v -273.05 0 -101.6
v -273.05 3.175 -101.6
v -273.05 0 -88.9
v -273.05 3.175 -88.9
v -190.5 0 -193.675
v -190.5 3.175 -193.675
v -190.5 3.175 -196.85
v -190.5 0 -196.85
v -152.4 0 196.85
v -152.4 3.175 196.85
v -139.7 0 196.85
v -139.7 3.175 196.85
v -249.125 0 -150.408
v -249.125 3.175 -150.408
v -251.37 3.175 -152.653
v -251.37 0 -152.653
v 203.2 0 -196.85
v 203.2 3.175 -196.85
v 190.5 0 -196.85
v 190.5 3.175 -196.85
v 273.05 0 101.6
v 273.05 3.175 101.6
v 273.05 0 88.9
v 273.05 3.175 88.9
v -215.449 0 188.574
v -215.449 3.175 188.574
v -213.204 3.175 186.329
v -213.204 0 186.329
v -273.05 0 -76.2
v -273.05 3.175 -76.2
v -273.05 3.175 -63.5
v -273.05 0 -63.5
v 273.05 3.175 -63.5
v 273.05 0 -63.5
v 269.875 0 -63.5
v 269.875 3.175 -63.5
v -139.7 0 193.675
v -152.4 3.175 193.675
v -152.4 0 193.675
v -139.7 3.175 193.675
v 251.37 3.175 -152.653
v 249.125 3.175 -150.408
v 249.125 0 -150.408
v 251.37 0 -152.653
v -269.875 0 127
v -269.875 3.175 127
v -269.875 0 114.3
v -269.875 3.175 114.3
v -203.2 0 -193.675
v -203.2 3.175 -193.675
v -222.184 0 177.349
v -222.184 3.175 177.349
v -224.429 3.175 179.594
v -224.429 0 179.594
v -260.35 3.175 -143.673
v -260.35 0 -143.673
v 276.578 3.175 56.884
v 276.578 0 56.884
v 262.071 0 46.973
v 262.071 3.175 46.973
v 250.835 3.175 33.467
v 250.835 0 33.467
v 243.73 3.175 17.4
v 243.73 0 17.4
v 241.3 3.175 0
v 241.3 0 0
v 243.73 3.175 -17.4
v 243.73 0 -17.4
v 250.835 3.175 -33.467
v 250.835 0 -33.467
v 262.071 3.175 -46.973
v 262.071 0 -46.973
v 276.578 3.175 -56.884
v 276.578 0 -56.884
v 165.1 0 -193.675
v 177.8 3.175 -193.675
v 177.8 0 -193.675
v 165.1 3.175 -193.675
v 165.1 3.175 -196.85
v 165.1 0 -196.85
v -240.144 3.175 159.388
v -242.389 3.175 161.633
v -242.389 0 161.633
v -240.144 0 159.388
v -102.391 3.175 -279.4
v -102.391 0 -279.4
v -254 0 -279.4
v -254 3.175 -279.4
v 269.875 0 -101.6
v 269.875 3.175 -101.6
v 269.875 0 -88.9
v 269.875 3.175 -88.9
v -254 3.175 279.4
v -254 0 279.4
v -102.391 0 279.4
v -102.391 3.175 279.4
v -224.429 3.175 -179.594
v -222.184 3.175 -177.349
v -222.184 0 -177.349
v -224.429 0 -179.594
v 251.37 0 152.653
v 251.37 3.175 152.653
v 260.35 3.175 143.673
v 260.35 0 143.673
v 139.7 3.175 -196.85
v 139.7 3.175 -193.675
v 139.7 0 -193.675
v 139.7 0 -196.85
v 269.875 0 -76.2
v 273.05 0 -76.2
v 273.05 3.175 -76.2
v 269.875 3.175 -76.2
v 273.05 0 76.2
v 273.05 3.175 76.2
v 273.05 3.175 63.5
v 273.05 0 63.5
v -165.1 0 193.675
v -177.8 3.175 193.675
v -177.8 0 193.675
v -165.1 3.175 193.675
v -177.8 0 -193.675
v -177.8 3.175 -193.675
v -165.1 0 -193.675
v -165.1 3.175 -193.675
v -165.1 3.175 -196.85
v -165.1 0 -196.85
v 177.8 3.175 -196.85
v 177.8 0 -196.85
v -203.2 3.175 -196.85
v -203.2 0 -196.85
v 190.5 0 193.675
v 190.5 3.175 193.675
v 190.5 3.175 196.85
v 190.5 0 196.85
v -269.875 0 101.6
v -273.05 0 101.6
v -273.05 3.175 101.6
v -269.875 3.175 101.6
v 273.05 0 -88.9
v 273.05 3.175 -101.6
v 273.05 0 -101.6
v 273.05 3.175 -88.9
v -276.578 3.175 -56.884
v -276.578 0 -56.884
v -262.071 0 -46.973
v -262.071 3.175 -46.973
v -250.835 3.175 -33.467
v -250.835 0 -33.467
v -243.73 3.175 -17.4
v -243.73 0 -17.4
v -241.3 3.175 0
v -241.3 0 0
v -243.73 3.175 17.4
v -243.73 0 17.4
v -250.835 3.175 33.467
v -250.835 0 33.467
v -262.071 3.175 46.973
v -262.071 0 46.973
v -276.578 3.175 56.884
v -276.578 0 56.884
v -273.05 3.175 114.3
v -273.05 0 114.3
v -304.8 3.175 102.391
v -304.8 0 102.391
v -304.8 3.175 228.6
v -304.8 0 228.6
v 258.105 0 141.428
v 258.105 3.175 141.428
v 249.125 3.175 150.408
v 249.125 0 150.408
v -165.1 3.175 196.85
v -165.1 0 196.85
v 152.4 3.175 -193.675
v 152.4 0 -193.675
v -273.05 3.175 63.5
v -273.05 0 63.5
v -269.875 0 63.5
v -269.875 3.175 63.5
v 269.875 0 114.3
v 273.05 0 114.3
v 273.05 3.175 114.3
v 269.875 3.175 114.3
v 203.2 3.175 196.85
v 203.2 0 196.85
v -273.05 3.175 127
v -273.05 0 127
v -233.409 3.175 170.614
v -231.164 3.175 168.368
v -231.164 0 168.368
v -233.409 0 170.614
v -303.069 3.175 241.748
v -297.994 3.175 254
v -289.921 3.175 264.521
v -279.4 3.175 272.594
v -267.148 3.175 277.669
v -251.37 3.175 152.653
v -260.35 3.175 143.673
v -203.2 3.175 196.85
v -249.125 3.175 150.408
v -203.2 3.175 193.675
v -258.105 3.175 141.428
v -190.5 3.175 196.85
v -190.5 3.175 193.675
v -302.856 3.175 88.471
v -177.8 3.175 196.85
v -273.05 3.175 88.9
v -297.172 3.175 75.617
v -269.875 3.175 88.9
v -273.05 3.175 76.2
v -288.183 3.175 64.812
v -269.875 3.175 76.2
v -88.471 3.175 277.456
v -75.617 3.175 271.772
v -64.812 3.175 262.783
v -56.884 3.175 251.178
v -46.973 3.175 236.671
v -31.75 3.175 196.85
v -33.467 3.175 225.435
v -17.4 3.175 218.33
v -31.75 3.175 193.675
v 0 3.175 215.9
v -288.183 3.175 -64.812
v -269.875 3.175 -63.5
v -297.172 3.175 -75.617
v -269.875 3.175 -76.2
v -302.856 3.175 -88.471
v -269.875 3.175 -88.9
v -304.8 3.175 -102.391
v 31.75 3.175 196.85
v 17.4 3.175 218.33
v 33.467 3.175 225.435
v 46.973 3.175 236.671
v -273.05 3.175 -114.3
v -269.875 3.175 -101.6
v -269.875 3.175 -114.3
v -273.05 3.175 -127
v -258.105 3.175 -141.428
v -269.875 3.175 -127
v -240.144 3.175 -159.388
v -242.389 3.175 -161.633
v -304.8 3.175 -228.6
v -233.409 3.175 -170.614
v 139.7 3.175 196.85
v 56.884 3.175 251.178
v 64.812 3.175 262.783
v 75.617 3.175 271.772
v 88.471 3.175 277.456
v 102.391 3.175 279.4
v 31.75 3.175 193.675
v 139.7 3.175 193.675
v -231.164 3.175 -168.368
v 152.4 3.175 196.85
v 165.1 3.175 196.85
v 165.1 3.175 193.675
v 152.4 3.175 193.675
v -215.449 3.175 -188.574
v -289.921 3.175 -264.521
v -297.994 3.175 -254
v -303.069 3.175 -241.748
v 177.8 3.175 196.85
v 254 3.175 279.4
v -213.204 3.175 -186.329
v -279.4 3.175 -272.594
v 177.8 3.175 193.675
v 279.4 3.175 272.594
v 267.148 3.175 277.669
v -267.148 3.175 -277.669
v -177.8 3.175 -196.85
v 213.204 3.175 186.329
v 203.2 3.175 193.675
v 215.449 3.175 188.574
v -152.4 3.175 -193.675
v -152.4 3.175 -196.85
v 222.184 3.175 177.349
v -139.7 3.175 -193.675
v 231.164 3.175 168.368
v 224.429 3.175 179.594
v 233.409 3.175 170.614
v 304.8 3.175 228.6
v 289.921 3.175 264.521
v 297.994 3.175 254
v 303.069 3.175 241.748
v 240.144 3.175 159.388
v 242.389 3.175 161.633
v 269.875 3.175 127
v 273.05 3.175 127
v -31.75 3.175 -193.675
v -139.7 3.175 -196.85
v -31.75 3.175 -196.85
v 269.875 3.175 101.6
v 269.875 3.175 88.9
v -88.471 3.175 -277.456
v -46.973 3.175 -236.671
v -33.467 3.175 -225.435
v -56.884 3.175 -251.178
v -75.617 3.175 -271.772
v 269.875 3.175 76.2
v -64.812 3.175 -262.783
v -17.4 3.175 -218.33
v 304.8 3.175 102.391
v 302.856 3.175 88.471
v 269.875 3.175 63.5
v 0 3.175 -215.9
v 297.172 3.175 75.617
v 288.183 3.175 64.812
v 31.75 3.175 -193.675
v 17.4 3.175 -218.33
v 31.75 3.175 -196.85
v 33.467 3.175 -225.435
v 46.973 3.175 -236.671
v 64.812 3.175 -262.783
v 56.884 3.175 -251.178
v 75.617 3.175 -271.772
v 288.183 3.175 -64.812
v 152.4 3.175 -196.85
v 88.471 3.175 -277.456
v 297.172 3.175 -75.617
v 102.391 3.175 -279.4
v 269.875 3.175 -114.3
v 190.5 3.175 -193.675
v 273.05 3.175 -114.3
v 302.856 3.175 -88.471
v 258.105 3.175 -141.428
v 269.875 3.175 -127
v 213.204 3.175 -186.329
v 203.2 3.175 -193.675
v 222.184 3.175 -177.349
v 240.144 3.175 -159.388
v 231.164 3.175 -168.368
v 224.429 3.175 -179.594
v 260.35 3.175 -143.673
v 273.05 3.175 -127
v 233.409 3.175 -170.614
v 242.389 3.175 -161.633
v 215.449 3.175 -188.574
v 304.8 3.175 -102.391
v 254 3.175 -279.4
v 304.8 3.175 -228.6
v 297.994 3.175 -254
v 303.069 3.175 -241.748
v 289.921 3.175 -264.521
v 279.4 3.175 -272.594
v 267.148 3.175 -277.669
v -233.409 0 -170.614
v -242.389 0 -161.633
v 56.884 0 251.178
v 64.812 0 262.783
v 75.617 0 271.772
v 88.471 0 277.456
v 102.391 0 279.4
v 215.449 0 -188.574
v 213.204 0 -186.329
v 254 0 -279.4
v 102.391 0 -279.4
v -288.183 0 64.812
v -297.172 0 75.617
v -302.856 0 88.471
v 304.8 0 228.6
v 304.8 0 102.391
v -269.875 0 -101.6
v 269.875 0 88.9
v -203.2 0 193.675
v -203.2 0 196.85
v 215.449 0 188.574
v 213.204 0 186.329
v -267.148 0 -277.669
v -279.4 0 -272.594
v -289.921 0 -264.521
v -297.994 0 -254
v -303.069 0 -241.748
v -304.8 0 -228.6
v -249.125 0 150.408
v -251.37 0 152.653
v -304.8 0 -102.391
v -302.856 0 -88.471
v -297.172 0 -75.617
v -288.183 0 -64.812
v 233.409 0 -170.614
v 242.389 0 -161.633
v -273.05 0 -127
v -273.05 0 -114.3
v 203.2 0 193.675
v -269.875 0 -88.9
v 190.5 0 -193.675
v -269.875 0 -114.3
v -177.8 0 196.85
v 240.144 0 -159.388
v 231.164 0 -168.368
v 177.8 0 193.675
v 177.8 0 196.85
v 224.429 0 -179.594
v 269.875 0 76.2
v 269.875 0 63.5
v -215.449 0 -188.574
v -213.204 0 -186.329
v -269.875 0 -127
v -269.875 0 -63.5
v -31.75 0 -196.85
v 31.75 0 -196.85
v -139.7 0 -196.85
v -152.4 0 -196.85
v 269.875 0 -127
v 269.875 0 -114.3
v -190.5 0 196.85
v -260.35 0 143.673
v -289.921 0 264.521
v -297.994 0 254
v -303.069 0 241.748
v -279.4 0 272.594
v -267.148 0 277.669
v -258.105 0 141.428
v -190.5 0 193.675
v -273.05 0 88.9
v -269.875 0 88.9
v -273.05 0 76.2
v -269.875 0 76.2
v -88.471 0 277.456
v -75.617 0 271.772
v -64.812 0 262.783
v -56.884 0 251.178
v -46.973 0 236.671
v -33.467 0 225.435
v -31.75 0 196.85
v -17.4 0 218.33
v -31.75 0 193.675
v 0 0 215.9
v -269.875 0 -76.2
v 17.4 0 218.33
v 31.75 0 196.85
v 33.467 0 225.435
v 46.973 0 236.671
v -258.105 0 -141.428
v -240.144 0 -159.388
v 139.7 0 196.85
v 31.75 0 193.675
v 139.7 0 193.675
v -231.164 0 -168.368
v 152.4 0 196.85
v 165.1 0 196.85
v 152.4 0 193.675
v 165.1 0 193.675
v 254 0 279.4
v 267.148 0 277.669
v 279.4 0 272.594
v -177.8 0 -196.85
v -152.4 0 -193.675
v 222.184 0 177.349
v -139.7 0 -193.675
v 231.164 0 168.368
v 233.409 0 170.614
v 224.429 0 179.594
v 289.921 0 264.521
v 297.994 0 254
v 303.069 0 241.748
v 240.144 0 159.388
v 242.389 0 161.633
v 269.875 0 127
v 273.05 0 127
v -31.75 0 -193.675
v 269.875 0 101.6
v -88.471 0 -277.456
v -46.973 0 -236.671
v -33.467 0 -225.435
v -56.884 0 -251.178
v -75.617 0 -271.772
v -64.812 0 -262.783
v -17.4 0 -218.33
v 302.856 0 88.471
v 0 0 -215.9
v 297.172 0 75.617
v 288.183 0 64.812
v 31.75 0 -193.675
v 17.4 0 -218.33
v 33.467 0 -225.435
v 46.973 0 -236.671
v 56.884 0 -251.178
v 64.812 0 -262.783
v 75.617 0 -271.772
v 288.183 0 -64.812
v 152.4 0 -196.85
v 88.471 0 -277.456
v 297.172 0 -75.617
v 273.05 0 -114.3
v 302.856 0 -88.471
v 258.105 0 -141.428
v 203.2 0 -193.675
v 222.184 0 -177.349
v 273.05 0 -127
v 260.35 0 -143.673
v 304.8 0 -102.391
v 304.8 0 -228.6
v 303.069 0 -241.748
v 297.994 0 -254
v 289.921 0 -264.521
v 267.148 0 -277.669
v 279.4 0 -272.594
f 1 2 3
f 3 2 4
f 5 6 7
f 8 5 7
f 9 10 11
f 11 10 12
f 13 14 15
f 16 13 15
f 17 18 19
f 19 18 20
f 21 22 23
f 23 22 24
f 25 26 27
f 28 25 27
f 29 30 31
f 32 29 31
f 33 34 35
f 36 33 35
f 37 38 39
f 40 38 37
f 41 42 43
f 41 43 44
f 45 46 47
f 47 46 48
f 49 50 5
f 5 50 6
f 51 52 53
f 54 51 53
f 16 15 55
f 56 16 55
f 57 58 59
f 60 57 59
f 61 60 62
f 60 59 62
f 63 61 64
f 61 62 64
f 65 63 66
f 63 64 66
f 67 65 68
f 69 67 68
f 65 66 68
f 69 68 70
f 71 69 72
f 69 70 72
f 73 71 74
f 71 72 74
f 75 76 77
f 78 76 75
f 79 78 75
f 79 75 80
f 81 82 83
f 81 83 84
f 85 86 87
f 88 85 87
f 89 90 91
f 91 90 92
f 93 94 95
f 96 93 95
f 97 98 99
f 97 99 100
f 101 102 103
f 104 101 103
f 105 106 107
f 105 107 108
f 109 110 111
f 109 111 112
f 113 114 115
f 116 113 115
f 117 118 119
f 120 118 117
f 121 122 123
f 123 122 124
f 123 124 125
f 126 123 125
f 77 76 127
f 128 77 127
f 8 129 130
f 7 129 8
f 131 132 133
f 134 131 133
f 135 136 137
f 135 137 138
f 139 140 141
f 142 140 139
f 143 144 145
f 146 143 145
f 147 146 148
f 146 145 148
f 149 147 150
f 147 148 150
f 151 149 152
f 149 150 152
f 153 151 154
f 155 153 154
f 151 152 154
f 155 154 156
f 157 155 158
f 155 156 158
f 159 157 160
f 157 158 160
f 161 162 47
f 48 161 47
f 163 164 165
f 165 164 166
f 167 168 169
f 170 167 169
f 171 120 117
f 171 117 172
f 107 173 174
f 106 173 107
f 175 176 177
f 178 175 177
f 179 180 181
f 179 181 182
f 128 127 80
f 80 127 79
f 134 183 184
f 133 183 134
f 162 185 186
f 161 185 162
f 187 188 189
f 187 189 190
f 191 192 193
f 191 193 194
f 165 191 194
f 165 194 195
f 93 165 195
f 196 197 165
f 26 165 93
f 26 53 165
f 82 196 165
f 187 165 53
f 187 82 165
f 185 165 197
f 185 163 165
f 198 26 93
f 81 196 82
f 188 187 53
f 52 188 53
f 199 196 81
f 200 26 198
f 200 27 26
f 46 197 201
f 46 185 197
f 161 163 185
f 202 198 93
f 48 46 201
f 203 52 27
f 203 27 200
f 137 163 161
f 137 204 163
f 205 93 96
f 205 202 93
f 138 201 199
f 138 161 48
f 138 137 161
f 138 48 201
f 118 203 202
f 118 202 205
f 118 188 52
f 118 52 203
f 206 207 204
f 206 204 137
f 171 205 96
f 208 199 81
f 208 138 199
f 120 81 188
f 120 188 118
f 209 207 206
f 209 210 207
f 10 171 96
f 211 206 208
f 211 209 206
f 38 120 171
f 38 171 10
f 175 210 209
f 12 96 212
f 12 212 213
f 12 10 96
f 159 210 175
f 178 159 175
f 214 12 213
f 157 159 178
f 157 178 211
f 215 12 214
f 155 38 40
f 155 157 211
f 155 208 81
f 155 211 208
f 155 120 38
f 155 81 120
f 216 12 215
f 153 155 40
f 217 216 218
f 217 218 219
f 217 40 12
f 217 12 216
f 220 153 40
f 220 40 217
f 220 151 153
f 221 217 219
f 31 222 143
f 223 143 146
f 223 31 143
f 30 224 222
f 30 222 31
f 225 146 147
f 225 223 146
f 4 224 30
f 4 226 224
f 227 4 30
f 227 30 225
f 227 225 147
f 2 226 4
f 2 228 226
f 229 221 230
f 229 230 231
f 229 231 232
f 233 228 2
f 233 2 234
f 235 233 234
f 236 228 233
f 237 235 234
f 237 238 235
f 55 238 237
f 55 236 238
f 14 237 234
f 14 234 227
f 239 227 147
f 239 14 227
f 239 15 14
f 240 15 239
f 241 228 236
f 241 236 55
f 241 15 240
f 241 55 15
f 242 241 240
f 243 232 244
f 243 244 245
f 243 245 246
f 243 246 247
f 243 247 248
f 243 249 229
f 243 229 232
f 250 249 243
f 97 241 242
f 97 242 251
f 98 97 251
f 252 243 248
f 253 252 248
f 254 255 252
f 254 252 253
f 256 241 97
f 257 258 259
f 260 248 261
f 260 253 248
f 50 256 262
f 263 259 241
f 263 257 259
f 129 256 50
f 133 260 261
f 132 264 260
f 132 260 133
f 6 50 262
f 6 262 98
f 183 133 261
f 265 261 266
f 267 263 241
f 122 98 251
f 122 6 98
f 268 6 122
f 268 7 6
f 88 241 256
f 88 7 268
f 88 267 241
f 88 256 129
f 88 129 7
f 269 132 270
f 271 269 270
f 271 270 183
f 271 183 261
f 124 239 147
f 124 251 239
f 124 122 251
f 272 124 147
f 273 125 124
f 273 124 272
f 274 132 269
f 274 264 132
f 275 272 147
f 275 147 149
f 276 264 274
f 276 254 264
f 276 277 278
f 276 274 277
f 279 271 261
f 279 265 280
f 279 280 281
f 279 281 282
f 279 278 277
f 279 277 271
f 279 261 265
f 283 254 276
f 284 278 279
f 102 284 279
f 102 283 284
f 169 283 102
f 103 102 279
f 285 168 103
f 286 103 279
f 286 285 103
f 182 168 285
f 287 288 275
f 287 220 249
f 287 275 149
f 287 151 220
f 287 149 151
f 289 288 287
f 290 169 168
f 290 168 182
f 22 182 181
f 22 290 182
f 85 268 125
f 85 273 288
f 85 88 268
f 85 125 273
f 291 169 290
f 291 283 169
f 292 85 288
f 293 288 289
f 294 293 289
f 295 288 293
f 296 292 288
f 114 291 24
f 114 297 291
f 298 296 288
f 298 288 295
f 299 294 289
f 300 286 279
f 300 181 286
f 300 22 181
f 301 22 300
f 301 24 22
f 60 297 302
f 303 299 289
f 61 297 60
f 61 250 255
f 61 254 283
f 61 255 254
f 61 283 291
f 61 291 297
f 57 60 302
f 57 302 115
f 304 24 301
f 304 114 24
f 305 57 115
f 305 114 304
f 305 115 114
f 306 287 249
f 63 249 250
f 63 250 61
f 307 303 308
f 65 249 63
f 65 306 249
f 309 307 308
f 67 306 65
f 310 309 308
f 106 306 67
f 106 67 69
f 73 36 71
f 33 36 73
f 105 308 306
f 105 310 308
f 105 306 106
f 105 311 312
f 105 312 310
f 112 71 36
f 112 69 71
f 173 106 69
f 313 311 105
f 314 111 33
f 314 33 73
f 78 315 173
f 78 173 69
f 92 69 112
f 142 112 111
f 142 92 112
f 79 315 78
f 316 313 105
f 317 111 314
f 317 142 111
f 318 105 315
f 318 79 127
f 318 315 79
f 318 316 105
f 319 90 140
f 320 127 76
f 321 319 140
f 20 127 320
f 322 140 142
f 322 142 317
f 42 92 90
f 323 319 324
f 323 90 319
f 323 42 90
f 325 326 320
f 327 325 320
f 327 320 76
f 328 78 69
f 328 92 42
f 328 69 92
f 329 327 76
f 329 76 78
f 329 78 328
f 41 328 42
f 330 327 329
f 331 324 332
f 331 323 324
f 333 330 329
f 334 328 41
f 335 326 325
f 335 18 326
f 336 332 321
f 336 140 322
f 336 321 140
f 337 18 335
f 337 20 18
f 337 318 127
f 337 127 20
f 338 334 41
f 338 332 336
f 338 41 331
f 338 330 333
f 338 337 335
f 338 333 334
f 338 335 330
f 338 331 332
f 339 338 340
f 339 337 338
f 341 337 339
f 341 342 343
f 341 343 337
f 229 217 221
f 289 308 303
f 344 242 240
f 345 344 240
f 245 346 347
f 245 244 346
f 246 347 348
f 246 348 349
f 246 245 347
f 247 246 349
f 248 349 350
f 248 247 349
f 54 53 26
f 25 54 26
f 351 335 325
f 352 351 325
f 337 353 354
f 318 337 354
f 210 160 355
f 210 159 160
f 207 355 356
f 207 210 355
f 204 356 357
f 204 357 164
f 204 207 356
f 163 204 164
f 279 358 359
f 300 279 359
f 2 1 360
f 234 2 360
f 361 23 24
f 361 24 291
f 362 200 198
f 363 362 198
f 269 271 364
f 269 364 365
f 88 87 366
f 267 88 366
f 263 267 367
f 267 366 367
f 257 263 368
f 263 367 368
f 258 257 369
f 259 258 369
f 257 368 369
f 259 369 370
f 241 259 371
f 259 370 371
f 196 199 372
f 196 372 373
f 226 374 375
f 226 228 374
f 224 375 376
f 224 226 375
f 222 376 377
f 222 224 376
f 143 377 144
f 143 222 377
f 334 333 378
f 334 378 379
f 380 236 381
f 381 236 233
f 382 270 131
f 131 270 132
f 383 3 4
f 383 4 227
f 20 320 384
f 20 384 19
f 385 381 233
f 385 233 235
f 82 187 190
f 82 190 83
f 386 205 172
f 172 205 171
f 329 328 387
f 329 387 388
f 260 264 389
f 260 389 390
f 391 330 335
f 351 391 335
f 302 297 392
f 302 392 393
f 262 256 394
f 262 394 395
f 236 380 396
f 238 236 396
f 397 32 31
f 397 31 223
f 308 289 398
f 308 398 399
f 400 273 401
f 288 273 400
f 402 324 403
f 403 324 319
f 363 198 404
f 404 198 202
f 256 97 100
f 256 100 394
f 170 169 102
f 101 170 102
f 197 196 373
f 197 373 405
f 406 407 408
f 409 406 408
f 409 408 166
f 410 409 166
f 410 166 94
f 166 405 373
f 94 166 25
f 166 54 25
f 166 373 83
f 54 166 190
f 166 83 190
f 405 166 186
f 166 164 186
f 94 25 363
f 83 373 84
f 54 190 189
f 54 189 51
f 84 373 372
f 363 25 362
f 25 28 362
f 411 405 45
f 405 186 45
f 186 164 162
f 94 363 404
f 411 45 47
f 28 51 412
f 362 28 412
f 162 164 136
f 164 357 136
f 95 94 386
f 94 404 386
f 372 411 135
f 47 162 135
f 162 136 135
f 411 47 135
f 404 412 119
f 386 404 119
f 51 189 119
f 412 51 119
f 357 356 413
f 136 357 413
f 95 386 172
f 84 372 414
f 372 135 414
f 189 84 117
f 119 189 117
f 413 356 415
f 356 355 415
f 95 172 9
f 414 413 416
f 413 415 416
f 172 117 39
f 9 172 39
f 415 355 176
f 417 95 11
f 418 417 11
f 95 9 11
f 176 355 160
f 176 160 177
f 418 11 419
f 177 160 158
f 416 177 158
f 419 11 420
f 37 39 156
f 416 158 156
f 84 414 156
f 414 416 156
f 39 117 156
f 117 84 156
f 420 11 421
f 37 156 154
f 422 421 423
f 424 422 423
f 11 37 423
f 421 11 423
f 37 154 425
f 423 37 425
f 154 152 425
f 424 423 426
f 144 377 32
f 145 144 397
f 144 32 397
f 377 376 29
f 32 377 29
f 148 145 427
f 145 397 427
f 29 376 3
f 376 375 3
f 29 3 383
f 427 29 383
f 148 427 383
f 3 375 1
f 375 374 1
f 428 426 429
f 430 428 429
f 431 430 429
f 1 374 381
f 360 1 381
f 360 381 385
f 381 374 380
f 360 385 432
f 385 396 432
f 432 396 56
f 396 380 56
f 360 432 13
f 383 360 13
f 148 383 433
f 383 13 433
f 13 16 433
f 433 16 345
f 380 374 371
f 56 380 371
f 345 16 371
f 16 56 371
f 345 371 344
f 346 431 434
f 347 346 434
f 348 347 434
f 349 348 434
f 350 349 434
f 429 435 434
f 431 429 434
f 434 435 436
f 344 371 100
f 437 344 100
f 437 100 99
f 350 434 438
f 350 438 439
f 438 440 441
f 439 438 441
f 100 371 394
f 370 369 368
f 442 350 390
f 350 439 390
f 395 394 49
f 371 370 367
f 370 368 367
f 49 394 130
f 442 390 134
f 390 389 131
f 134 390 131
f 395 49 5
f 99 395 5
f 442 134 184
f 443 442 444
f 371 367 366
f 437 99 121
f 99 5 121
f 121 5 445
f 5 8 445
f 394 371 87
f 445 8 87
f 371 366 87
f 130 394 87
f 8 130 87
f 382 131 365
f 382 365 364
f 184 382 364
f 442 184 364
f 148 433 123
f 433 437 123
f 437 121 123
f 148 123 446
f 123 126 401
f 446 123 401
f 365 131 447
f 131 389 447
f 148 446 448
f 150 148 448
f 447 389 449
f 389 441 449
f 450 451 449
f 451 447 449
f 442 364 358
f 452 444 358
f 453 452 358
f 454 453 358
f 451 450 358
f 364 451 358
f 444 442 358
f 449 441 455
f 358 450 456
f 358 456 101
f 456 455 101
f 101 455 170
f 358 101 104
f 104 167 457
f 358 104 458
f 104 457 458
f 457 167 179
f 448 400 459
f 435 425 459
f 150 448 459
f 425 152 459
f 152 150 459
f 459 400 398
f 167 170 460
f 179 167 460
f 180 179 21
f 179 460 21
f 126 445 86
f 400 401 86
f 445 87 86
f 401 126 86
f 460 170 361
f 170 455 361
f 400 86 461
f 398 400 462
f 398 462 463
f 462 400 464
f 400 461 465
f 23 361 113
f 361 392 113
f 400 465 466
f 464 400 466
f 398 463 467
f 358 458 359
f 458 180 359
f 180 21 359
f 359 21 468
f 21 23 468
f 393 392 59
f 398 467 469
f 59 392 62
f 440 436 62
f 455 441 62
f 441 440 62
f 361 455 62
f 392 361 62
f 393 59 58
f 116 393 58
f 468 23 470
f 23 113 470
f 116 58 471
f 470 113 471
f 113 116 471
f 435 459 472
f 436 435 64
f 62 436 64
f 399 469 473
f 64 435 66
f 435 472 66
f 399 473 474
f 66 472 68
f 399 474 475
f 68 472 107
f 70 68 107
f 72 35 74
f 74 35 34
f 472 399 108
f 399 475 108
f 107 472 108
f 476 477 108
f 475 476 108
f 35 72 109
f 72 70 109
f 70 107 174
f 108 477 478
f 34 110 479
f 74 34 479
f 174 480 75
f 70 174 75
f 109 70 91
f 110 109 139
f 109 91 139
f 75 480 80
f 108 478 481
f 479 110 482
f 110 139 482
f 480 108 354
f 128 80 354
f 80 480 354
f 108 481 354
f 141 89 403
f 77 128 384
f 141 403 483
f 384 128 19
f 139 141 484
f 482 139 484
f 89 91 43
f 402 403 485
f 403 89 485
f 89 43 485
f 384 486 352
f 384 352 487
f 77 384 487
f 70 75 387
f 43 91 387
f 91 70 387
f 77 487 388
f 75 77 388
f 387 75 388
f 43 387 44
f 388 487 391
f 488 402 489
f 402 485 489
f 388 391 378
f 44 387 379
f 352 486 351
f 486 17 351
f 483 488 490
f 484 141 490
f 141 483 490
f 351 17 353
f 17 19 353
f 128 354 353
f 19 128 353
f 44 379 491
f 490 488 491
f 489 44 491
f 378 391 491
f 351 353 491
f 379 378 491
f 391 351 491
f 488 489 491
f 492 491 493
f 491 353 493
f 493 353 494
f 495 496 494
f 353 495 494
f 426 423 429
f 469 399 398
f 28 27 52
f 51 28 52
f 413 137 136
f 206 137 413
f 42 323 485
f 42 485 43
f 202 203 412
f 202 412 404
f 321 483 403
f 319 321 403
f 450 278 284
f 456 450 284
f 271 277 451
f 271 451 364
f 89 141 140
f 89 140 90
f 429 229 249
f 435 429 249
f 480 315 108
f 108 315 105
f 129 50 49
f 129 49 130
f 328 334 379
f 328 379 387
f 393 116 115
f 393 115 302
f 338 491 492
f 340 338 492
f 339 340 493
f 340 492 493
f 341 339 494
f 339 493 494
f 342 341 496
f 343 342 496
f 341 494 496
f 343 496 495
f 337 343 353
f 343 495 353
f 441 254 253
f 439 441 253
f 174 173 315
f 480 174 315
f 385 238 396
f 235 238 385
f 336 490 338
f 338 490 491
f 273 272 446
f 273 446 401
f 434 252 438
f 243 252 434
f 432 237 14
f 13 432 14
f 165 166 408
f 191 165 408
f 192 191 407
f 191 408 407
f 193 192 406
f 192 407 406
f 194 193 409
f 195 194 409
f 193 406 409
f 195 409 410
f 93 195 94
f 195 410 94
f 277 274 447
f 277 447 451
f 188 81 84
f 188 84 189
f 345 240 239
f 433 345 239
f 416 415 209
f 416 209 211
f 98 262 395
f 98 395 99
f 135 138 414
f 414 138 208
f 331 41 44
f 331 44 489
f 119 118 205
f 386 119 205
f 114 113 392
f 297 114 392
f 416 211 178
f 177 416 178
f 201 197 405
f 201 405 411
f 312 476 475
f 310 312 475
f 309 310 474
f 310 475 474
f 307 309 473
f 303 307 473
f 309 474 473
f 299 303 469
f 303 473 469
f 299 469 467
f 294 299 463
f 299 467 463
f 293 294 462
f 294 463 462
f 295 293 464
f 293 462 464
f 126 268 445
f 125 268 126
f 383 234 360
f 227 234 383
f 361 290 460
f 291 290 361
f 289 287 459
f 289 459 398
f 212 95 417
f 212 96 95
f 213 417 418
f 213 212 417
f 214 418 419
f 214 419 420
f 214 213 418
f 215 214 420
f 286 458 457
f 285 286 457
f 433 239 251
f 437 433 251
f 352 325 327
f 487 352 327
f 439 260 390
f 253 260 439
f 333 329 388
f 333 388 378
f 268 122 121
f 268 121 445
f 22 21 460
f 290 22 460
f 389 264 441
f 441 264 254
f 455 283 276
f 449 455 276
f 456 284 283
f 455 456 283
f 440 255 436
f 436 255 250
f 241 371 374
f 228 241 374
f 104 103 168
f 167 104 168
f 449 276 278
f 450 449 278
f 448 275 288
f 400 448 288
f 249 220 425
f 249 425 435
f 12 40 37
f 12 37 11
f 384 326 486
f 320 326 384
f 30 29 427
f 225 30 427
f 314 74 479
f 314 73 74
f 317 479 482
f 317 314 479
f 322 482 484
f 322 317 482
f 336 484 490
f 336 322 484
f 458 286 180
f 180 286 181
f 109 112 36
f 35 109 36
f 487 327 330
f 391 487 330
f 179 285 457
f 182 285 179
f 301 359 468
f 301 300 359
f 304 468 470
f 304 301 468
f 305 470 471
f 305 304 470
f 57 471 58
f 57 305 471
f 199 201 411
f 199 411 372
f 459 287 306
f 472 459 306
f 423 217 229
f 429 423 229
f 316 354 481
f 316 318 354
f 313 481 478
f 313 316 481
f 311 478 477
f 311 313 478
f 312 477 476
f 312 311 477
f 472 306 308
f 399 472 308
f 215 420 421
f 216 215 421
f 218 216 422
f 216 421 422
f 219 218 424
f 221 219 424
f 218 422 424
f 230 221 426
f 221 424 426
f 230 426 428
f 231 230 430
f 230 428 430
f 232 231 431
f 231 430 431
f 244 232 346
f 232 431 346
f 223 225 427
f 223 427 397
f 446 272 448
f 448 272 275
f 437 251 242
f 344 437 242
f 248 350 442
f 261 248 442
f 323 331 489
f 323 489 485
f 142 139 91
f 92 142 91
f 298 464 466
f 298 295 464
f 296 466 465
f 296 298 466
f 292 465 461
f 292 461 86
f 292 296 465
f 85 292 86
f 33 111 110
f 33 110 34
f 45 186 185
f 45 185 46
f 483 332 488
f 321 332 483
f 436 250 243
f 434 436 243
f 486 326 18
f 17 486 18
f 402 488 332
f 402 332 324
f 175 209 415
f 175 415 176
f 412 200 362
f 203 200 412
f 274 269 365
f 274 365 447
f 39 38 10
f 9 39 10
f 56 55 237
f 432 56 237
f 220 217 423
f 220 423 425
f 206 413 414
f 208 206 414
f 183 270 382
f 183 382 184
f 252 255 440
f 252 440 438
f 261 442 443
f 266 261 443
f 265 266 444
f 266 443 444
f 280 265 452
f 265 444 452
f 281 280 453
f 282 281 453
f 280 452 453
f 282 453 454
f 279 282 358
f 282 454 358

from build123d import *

# Parameters (mm, degrees)
BOSS_EXTRUDE1_DEPTH     = 3.175
FILLET1_R               = 50.8
SKETCH2_W               = 12.7
SKETCH2_H               = 3.175
CUT_EXTRUDE1_DEPTH      = 3.175
MIRROR2_COPY_1_SKETCH_W = 12.7
MIRROR2_COPY_1_SKETCH_H = 3.175
MIRROR2_COPY_1_DEPTH    = 3.175
CUT_EXTRUDE2_DEPTH      = 3.175
SKETCH4_W               = 63.5
SKETCH4_H               = 3.175
CUT_EXTRUDE3_DEPTH      = 3.175
MIRROR5_COPY_1_DEPTH    = 3.175
MIRROR5_COPY_2_DEPTH    = 3.175
SKETCH5_W               = 3.175
SKETCH5_H               = 12.7
CUT_EXTRUDE4_DEPTH      = 3.175
MIRROR7_COPY_1_SKETCH_W = 3.175
MIRROR7_COPY_1_SKETCH_H = 12.7
MIRROR7_COPY_1_DEPTH    = 3.175


with BuildPart() as part:
    # Sketch1 → Boss-Extrude1 (new body)
    with BuildSketch(Plane(origin=(0, 0, 0), x_dir=(1, 0, 0), z_dir=(0, 1, 0))):
        with BuildLine():
            ThreePointArc((-304.8, -228.6), (-289.921024484, -264.521024484), (-254, -279.4))
            Line((-254, -279.4), (-63.5, -279.4))
            ThreePointArc((-63.5, -279.4), (0, -215.9), (63.5, -279.4))
            Line((63.5, -279.4), (254, -279.4))
            ThreePointArc((254, -279.4), (289.921024484, -264.521024484), (304.8, -228.6))
            Line((304.8, -228.6), (304.8, -63.5))
            ThreePointArc((304.8, -63.5), (241.3, 0), (304.8, 63.5))
            Line((304.8, 63.5), (304.8, 228.6))
            ThreePointArc((304.8, 228.6), (289.921024484, 264.521024484), (254, 279.4))
            Line((254, 279.4), (63.5, 279.4))
            ThreePointArc((63.5, 279.4), (0, 215.9), (-63.5, 279.4))
            Line((-63.5, 279.4), (-254, 279.4))
            ThreePointArc((-254, 279.4), (-289.921024484, 264.521024484), (-304.8, 228.6))
            Line((-304.8, 228.6), (-304.8, 63.5))
            ThreePointArc((-304.8, 63.5), (-241.3, 0), (-304.8, -63.5))
            Line((-304.8, -63.5), (-304.8, -228.6))
        make_face()
    extrude(amount=BOSS_EXTRUDE1_DEPTH)

    # Fillet1
    fillet1_edges = [part.edges().sort_by_distance(p)[0] for p in [
        (-63.5, 1.5875, -279.4),
        (63.5, 1.5875, -279.4),
        (304.8, 1.5875, -63.5),
        (304.8, 1.5875, 63.5),
        (63.5, 1.5875, 279.4),
        (-63.5, 1.5875, 279.4),
        (-304.8, 1.5875, 63.5),
        (-304.8, 1.5875, -63.5),
    ]]
    fillet(fillet1_edges, radius=FILLET1_R)

    # Sketch2 → Cut-Extrude1 (cut)
    with BuildSketch(Plane(origin=(0, 3.175, 0), x_dir=(1, 0, 0), z_dir=(0, 1, 0))):
        with Locations((-171.45, 195.2625)):
            Rectangle(SKETCH2_W, SKETCH2_H)
        with Locations((-196.85, 195.2625)):
            Rectangle(SKETCH2_W, SKETCH2_H)
        with Locations((-146.05, 195.2625)):
            Rectangle(SKETCH2_W, SKETCH2_H)
    cut_extrude1 = extrude(amount=-CUT_EXTRUDE1_DEPTH, mode=Mode.SUBTRACT)

    # Mirror1: Cut-Extrude1 across plane
    add(cut_extrude1.mirror(Plane.XY), mode=Mode.SUBTRACT)

    # Mirror2: Cut-Extrude1 across plane
    add(cut_extrude1.mirror(Plane(origin=(0, 0, 0), x_dir=(0, 0, 1), z_dir=(1, 0, 0))), mode=Mode.SUBTRACT)

    # Mirror2 copy 1 sketch → Mirror2 copy 1 (cut)
    with BuildSketch(Plane(origin=(0, 3.175, 0), x_dir=(-1, 0, 0), z_dir=(0, 1, 0))):
        with Locations((-171.45, 195.2625)):
            Rectangle(MIRROR2_COPY_1_SKETCH_W, MIRROR2_COPY_1_SKETCH_H)
        with Locations((-196.85, 195.2625)):
            Rectangle(MIRROR2_COPY_1_SKETCH_W, MIRROR2_COPY_1_SKETCH_H)
        with Locations((-146.05, 195.2625)):
            Rectangle(MIRROR2_COPY_1_SKETCH_W, MIRROR2_COPY_1_SKETCH_H)
    extrude(amount=-MIRROR2_COPY_1_DEPTH, mode=Mode.SUBTRACT)

    # Sketch3 → Cut-Extrude2 (cut)
    with BuildSketch(Plane(origin=(0, 3.175, 0), x_dir=(1, 0, 0), z_dir=(0, 1, 0))):
        Polygon((-251.369743879, 152.653015062), (-260.35, 143.672758941), (-258.10493597, 141.42769491), (-249.124679849, 150.407951031), align=None)
        Polygon((-233.409231637, 170.613527304), (-242.389487758, 161.633271183), (-240.144423728, 159.388207153), (-231.164167607, 168.368463274), align=None)
        Polygon((-213.203655364, 186.328975516), (-222.183911485, 177.348719395), (-224.428975516, 179.593783425), (-215.448719395, 188.574039546), align=None)
    cut_extrude2 = extrude(amount=-CUT_EXTRUDE2_DEPTH, mode=Mode.SUBTRACT)

    # Sketch4 → Cut-Extrude3 (cut)
    with BuildSketch(Plane(origin=(0, 3.175, 0), x_dir=(1, 0, 0), z_dir=(0, 1, 0))):
        with Locations((0, 195.2625)):
            Rectangle(SKETCH4_W, SKETCH4_H)
        with Locations((0, -195.2625)):
            Rectangle(SKETCH4_W, SKETCH4_H)
    cut_extrude3 = extrude(amount=-CUT_EXTRUDE3_DEPTH, mode=Mode.SUBTRACT)

    # Mirror4: Cut-Extrude2 across plane
    add(cut_extrude2.mirror(Plane.XY), mode=Mode.SUBTRACT)

    # Mirror5: Cut-Extrude3 across plane
    add(cut_extrude3.mirror(Plane(origin=(0, 0, 0), x_dir=(0, 0, 1), z_dir=(1, 0, 0))), mode=Mode.SUBTRACT)

    # Mirror5 copy 1 sketch → Mirror5 copy 1 (cut)
    with BuildSketch(Plane(origin=(0, 3.175, 0), x_dir=(-1, 0, 0), z_dir=(0, 1, 0))):
        Polygon((-251.369743879, 152.653015062), (-260.35, 143.672758941), (-258.10493597, 141.42769491), (-249.124679849, 150.407951031), align=None)
        Polygon((-233.409231637, 170.613527304), (-242.389487758, 161.633271183), (-240.144423728, 159.388207153), (-231.164167607, 168.368463274), align=None)
        Polygon((-213.203655364, 186.328975516), (-222.183911485, 177.348719395), (-224.428975516, 179.593783425), (-215.448719395, 188.574039546), align=None)
    extrude(amount=-MIRROR5_COPY_1_DEPTH, mode=Mode.SUBTRACT)

    # Mirror5 copy 2 sketch → Mirror5 copy 2 (cut)
    with BuildSketch(Plane(origin=(0, 3.175, 0), x_dir=(-1, 0, 0), z_dir=(0, 1, 0))):
        Polygon((-251.369743879, -152.653015062), (-260.35, -143.672758941), (-258.10493597, -141.42769491), (-249.124679849, -150.407951031), align=None)
        Polygon((-233.409231637, -170.613527304), (-242.389487758, -161.633271183), (-240.144423728, -159.388207153), (-231.164167607, -168.368463274), align=None)
        Polygon((-213.203655364, -186.328975516), (-222.183911485, -177.348719395), (-224.428975516, -179.593783425), (-215.448719395, -188.574039546), align=None)
    extrude(amount=-MIRROR5_COPY_2_DEPTH, mode=Mode.SUBTRACT)

    # Sketch5 → Cut-Extrude4 (cut)
    with BuildSketch(Plane(origin=(0, 3.175, 0), x_dir=(1, 0, 0), z_dir=(0, 1, 0))):
        with Locations((-271.4625, -95.25)):
            Rectangle(SKETCH5_W, SKETCH5_H)
        with Locations((-271.4625, -69.85)):
            Rectangle(SKETCH5_W, SKETCH5_H)
        with Locations((-271.4625, -120.65)):
            Rectangle(SKETCH5_W, SKETCH5_H)
    cut_extrude4 = extrude(amount=-CUT_EXTRUDE4_DEPTH, mode=Mode.SUBTRACT)

    # Mirror6: Cut-Extrude4 across plane
    add(cut_extrude4.mirror(Plane(origin=(0, 0, 0), x_dir=(0, 0, 1), z_dir=(1, 0, 0))), mode=Mode.SUBTRACT)

    # Mirror7: Cut-Extrude4 across plane
    add(cut_extrude4.mirror(Plane.XY), mode=Mode.SUBTRACT)

    # Mirror7 copy 1 sketch → Mirror7 copy 1 (cut)
    with BuildSketch(Plane(origin=(0, 3.175, 0), x_dir=(-1, 0, 0), z_dir=(0, 1, 0))):
        with Locations((-271.4625, -95.25)):
            Rectangle(MIRROR7_COPY_1_SKETCH_W, MIRROR7_COPY_1_SKETCH_H)
        with Locations((-271.4625, -69.85)):
            Rectangle(MIRROR7_COPY_1_SKETCH_W, MIRROR7_COPY_1_SKETCH_H)
        with Locations((-271.4625, -120.65)):
            Rectangle(MIRROR7_COPY_1_SKETCH_W, MIRROR7_COPY_1_SKETCH_H)
    extrude(amount=-MIRROR7_COPY_1_DEPTH, mode=Mode.SUBTRACT)


solid = part.part
